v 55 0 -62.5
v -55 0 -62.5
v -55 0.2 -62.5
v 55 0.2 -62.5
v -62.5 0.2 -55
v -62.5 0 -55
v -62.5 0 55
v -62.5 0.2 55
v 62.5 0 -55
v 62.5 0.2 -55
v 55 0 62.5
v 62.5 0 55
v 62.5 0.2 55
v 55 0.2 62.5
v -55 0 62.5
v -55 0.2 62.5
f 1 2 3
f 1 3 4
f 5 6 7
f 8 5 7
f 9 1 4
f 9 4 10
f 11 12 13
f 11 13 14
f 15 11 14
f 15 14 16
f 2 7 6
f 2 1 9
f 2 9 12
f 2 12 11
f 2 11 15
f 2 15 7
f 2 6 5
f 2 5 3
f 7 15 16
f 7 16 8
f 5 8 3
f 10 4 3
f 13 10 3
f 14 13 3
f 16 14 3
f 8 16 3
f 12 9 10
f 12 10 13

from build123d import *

# Parameters (mm, degrees)
SALIENTE_EXTRUIR1_DEPTH = 0.2


with BuildPart() as part:
    # Croquis2 → Saliente-Extruir1 (new body)
    with BuildSketch(Plane(origin=(0, 0, 0), x_dir=(1, 0, 0), z_dir=(0, 1, 0))):
        Polygon((-62.5, 0), (-62.5, 55), (-55, 62.5), (55, 62.5), (62.5, 55), (62.5, -55), (55, -62.5), (-55, -62.5), (-62.5, -55), align=None)
    extrude(amount=SALIENTE_EXTRUIR1_DEPTH)


solid = part.part
